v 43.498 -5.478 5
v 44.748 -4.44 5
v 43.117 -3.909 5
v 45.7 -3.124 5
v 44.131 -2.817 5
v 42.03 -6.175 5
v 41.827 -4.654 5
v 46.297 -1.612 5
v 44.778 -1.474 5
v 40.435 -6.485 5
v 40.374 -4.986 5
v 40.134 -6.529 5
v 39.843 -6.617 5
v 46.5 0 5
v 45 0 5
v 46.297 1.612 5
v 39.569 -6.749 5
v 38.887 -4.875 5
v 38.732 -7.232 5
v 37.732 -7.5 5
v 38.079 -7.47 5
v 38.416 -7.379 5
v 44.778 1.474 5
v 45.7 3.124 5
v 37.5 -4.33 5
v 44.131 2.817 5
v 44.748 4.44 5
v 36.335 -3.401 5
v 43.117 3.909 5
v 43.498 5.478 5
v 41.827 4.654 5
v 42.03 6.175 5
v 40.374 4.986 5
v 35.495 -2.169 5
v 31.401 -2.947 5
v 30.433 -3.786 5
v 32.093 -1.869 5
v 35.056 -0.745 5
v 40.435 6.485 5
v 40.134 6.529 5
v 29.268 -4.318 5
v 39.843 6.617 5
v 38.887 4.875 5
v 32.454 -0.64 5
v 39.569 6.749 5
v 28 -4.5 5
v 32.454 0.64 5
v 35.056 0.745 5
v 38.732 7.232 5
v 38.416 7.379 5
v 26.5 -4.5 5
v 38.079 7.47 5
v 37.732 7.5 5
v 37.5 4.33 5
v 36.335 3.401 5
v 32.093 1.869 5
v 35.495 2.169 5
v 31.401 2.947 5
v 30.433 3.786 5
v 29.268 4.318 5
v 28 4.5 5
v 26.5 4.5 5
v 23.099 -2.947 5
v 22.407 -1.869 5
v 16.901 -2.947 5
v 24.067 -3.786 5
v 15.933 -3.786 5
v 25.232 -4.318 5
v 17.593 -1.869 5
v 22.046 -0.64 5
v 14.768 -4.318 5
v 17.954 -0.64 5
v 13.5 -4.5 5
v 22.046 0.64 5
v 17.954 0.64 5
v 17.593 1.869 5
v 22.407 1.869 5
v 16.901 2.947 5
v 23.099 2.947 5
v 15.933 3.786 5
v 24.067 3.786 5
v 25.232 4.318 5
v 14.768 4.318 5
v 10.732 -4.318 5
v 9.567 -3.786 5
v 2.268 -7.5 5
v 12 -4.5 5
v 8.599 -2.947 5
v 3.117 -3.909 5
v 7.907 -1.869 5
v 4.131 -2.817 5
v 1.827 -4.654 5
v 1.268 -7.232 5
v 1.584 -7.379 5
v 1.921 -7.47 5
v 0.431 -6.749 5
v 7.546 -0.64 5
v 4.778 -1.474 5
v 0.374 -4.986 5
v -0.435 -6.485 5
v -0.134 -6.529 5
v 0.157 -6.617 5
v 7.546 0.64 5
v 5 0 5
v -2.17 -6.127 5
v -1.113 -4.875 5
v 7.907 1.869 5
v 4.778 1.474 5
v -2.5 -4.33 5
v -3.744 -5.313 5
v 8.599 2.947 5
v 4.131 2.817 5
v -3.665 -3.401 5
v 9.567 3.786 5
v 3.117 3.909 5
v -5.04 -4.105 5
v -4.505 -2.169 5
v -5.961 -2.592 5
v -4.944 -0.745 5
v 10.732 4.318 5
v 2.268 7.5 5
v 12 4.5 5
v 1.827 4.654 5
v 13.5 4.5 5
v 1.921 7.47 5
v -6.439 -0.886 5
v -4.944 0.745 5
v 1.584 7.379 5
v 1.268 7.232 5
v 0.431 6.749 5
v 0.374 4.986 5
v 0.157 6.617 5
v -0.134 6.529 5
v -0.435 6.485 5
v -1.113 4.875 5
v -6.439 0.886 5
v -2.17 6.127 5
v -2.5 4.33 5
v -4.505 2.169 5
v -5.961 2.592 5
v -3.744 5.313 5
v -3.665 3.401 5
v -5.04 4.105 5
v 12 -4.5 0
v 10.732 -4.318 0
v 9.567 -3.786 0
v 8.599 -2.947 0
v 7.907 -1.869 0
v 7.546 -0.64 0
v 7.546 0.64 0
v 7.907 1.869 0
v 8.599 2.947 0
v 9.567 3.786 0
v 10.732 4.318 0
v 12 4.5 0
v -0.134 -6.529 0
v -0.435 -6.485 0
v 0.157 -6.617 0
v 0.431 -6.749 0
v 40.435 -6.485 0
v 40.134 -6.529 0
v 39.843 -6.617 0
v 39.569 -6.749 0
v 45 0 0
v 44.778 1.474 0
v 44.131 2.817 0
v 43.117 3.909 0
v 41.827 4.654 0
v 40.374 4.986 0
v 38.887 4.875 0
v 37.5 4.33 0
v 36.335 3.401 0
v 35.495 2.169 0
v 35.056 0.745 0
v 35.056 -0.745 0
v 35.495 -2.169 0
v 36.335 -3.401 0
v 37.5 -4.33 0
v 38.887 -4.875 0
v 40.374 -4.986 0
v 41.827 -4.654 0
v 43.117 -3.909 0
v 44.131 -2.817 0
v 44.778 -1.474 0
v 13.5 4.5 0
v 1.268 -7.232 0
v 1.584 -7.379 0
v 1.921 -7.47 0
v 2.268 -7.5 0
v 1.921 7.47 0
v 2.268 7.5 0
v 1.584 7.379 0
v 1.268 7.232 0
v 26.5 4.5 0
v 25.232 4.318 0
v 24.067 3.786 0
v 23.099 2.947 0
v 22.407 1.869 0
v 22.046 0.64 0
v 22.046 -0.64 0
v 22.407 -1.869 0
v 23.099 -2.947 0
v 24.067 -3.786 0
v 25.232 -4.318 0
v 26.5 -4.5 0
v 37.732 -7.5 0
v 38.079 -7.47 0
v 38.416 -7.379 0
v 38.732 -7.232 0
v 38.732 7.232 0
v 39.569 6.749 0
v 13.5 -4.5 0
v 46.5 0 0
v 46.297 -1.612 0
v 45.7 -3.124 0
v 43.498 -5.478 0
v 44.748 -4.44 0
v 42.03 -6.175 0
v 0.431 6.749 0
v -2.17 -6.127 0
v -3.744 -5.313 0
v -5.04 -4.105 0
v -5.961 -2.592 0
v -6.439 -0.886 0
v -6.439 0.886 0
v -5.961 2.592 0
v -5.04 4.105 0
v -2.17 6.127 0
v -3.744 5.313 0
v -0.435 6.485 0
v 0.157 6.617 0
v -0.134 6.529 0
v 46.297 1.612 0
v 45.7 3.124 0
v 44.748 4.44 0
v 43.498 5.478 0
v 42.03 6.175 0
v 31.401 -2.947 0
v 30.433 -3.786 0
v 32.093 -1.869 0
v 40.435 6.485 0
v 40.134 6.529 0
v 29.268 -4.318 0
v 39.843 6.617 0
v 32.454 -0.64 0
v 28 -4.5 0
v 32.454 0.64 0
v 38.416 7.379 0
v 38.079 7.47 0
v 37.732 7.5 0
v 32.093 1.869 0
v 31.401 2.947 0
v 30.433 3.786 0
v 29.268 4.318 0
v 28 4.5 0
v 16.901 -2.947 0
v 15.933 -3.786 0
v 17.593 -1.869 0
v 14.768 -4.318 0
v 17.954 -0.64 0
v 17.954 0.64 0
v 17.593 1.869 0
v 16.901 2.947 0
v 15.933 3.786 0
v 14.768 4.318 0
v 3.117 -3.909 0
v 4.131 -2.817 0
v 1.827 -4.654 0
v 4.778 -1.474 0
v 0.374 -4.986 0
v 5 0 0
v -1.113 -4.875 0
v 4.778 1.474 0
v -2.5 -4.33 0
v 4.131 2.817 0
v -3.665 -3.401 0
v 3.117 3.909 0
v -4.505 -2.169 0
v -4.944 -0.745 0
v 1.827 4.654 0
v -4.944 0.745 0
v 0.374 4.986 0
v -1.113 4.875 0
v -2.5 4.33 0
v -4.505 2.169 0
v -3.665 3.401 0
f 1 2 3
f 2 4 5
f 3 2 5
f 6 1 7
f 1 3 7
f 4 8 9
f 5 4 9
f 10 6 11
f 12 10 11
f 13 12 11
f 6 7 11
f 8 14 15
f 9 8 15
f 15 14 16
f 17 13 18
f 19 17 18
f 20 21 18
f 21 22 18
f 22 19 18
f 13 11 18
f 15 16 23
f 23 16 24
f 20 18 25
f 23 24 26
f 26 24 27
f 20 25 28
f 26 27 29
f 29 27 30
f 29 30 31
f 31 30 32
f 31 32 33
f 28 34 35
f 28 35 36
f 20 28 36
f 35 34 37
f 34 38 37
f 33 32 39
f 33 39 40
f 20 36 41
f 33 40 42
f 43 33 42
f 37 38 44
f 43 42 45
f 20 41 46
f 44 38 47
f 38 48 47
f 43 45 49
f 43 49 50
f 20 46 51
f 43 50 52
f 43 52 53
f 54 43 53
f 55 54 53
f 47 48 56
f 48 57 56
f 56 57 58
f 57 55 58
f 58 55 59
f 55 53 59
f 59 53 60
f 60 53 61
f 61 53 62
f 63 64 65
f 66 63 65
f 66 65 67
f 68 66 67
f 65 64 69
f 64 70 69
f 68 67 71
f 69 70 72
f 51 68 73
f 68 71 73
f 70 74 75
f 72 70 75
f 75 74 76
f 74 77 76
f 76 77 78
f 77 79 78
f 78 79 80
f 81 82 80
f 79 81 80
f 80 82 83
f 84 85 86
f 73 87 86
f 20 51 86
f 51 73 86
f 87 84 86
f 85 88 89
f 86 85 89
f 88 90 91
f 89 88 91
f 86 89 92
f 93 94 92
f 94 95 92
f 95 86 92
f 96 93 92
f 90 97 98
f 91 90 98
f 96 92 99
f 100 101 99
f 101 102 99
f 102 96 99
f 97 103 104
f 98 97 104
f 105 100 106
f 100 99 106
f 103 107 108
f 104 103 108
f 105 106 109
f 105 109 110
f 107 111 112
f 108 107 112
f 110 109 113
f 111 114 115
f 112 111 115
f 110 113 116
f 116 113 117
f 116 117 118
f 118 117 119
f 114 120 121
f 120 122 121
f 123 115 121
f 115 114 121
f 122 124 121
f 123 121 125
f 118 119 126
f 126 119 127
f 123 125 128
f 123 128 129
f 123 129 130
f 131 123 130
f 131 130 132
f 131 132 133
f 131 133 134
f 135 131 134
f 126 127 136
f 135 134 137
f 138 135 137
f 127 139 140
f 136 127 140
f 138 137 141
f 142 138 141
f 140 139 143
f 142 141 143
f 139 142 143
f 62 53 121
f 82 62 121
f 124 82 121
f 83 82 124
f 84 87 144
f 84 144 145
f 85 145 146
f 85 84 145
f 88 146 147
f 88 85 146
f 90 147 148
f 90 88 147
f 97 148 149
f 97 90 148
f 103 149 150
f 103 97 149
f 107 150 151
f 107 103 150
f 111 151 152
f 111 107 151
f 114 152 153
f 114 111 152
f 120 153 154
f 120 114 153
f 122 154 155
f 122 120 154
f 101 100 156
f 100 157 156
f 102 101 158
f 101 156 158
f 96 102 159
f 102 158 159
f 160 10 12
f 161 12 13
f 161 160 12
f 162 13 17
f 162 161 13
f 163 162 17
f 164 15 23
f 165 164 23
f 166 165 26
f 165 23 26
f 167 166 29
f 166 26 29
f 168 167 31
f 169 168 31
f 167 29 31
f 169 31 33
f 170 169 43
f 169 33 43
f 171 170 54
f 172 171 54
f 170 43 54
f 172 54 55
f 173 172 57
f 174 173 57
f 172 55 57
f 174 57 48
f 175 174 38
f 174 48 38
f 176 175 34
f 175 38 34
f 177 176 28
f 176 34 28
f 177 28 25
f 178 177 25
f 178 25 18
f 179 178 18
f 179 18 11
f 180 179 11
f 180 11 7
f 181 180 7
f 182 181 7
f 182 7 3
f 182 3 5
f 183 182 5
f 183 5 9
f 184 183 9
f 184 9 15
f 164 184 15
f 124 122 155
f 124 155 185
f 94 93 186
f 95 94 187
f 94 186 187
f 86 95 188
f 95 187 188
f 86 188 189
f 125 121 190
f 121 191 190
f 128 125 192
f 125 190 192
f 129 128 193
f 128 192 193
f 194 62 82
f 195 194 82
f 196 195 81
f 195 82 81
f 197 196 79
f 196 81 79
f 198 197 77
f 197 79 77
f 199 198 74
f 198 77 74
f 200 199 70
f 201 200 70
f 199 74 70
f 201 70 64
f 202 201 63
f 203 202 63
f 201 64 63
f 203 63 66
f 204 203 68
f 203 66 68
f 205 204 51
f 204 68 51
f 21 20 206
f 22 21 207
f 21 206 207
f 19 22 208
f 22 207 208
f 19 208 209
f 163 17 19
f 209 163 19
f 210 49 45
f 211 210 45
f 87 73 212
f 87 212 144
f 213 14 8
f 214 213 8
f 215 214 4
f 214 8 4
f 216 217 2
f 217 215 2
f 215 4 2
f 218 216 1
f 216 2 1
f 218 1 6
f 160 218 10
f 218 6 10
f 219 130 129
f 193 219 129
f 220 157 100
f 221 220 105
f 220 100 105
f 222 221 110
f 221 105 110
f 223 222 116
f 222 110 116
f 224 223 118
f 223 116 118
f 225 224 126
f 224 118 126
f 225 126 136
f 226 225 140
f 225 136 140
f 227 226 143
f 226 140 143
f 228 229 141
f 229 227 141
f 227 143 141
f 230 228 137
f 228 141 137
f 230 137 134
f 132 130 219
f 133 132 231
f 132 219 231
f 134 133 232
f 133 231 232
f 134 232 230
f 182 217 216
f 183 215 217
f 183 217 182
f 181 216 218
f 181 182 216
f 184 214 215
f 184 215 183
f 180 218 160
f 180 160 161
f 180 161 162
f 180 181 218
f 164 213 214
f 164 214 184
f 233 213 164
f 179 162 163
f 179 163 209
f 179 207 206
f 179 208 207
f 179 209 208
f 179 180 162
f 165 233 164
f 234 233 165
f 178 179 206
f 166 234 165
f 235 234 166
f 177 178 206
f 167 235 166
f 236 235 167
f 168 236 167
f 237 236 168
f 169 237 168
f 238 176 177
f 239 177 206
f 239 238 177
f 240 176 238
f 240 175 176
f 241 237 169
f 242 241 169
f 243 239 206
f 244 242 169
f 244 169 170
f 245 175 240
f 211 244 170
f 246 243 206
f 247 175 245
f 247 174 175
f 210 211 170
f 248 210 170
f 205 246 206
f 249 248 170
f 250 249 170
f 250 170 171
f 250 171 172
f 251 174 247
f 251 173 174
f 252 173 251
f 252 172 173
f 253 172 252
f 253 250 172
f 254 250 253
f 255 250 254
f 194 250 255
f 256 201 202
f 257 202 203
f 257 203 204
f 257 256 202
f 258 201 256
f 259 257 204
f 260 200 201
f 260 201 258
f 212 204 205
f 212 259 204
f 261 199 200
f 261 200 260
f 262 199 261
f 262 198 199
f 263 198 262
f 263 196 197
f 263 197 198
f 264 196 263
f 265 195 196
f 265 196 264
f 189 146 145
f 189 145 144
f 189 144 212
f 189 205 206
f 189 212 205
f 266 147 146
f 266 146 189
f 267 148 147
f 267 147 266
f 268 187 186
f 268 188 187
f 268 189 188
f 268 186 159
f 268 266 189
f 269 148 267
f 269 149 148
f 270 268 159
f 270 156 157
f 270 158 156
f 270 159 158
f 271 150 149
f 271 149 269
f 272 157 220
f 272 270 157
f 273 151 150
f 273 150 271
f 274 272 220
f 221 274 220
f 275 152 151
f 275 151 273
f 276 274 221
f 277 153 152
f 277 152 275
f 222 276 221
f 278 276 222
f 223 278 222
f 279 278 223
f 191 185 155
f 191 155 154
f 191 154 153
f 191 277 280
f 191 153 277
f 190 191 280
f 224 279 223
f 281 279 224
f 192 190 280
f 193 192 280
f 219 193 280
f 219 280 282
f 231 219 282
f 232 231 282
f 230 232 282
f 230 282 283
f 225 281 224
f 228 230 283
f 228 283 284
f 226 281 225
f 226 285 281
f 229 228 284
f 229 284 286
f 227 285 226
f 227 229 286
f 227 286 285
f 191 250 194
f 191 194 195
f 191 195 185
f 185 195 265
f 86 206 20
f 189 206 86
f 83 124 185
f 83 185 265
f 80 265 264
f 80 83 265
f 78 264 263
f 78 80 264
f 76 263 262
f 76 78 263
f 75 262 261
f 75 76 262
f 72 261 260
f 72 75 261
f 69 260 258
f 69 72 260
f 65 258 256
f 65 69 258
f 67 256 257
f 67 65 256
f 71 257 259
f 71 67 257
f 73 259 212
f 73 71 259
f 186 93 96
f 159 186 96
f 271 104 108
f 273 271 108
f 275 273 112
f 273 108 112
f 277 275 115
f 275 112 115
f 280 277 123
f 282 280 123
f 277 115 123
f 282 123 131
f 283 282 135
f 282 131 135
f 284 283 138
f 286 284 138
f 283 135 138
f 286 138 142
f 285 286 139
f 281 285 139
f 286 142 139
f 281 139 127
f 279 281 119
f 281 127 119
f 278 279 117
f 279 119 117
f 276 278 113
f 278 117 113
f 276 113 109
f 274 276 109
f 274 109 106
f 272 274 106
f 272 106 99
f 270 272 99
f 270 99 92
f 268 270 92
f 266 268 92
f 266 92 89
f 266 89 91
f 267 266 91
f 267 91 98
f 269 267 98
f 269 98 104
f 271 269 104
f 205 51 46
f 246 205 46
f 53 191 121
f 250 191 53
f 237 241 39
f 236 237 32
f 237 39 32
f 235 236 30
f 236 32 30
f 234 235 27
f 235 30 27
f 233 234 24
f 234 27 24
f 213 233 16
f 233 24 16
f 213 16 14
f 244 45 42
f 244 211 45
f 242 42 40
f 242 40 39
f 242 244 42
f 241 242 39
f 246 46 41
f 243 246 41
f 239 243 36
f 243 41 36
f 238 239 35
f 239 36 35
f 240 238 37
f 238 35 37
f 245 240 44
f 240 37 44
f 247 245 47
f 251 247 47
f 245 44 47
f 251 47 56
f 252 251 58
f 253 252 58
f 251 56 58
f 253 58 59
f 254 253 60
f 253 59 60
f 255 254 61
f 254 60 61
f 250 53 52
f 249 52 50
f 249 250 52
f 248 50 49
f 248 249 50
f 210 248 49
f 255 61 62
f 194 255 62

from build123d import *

# Parameters (mm, degrees)
SKETCH_1_R          = 3.5
EXTRUDE_1_DEPTH     = 5
CUT_EXTRUDE_2_DEPTH = 49.347699015
SKETCH_6_R          = 5
CUT_EXTRUDE_3_DEPTH = 6
CUT_EXTRUDE_4_DEPTH = 10
FILLET_1_R          = 2


with BuildPart() as part:
    # 草图1 → 凸台-拉伸1 (new body)
    with BuildSketch(Plane.XY):
        with BuildLine():
            Line((0, 7.5), (40, 7.5))
            ThreePointArc((40, 7.5), (47.5, 0), (40, -7.5))
            Line((40, -7.5), (0, -7.5))
            ThreePointArc((0, -7.5), (-7.5, 0), (0, 7.5))
        make_face()
        Circle(SKETCH_1_R, mode=Mode.SUBTRACT)
        with Locations((40, 0)):
            Circle(SKETCH_1_R, mode=Mode.SUBTRACT)
    extrude(amount=EXTRUDE_1_DEPTH)

    # 草图3 → 切除-拉伸2 (cut, through all)
    with BuildSketch(Plane.XY.offset(5)):
        with BuildLine():
            ThreePointArc((0, -6.5), (-6.5, 0), (0, 6.5))
            Line((0, 6.5), (1.732050808, 7.5))
            Line((1.732050808, 7.5), (0, 7.5))
            ThreePointArc((0, 7.5), (-7.5, 0), (0, -7.5))
            Line((0, -7.5), (1.732050808, -7.5))
            Line((1.732050808, -7.5), (0, -6.5))
        make_face()
        with BuildLine():
            Line((40, 7.5), (38.267949192, 7.5))
            Line((38.267949192, 7.5), (40, 6.5))
            ThreePointArc((40, 6.5), (44.596194078, 4.596194078), (46.5, 0))
            ThreePointArc((46.5, 0), (44.596194078, -4.596194078), (40, -6.5))
            Line((40, -6.5), (38.267949192, -7.5))
            Line((38.267949192, -7.5), (40, -7.5))
            ThreePointArc((40, -7.5), (47.5, 0), (40, 7.5))
        make_face()
    extrude(amount=-CUT_EXTRUDE_2_DEPTH, mode=Mode.SUBTRACT)

    # 草图6 → 切除-拉伸3 (cut)
    with BuildSketch(Plane.XY.offset(5)):
        Circle(SKETCH_6_R)
        with Locations((40, 0)):
            Circle(SKETCH_6_R)
    extrude(amount=-CUT_EXTRUDE_3_DEPTH, mode=Mode.SUBTRACT)

    # 草图4 → 切除-拉伸4 (cut)
    with BuildSketch(Plane.XY.offset(5)):
        with BuildLine():
            Line((12, 4.5), (13.5, 4.5))
            ThreePointArc((13.5, 4.5), (18, 0), (13.5, -4.5))
            Line((13.5, -4.5), (12, -4.5))
            ThreePointArc((12, -4.5), (7.5, 0), (12, 4.5))
        make_face()
        with BuildLine():
            Line((28, 4.5), (26.5, 4.5))
            ThreePointArc((26.5, 4.5), (22, 0), (26.5, -4.5))
            Line((26.5, -4.5), (28, -4.5))
            ThreePointArc((28, -4.5), (32.5, 0), (28, 4.5))
        make_face()
    extrude(amount=-CUT_EXTRUDE_4_DEPTH, mode=Mode.SUBTRACT)

    # 圆角1
    fillet_1_edges = [part.edges().sort_by_distance(p)[0] for p in [
        (0, 6.5, 2.5),
        (0, -6.5, 2.5),
        (1.732050808, -7.5, 2.5),
        (1.732050808, 7.5, 2.5),
        (40, 6.5, 2.5),
        (38.267949192, 7.5, 2.5),
        (38.267949192, -7.5, 2.5),
        (40, -6.5, 2.5),
    ]]
    fillet(fillet_1_edges, radius=FILLET_1_R)


solid = part.part
